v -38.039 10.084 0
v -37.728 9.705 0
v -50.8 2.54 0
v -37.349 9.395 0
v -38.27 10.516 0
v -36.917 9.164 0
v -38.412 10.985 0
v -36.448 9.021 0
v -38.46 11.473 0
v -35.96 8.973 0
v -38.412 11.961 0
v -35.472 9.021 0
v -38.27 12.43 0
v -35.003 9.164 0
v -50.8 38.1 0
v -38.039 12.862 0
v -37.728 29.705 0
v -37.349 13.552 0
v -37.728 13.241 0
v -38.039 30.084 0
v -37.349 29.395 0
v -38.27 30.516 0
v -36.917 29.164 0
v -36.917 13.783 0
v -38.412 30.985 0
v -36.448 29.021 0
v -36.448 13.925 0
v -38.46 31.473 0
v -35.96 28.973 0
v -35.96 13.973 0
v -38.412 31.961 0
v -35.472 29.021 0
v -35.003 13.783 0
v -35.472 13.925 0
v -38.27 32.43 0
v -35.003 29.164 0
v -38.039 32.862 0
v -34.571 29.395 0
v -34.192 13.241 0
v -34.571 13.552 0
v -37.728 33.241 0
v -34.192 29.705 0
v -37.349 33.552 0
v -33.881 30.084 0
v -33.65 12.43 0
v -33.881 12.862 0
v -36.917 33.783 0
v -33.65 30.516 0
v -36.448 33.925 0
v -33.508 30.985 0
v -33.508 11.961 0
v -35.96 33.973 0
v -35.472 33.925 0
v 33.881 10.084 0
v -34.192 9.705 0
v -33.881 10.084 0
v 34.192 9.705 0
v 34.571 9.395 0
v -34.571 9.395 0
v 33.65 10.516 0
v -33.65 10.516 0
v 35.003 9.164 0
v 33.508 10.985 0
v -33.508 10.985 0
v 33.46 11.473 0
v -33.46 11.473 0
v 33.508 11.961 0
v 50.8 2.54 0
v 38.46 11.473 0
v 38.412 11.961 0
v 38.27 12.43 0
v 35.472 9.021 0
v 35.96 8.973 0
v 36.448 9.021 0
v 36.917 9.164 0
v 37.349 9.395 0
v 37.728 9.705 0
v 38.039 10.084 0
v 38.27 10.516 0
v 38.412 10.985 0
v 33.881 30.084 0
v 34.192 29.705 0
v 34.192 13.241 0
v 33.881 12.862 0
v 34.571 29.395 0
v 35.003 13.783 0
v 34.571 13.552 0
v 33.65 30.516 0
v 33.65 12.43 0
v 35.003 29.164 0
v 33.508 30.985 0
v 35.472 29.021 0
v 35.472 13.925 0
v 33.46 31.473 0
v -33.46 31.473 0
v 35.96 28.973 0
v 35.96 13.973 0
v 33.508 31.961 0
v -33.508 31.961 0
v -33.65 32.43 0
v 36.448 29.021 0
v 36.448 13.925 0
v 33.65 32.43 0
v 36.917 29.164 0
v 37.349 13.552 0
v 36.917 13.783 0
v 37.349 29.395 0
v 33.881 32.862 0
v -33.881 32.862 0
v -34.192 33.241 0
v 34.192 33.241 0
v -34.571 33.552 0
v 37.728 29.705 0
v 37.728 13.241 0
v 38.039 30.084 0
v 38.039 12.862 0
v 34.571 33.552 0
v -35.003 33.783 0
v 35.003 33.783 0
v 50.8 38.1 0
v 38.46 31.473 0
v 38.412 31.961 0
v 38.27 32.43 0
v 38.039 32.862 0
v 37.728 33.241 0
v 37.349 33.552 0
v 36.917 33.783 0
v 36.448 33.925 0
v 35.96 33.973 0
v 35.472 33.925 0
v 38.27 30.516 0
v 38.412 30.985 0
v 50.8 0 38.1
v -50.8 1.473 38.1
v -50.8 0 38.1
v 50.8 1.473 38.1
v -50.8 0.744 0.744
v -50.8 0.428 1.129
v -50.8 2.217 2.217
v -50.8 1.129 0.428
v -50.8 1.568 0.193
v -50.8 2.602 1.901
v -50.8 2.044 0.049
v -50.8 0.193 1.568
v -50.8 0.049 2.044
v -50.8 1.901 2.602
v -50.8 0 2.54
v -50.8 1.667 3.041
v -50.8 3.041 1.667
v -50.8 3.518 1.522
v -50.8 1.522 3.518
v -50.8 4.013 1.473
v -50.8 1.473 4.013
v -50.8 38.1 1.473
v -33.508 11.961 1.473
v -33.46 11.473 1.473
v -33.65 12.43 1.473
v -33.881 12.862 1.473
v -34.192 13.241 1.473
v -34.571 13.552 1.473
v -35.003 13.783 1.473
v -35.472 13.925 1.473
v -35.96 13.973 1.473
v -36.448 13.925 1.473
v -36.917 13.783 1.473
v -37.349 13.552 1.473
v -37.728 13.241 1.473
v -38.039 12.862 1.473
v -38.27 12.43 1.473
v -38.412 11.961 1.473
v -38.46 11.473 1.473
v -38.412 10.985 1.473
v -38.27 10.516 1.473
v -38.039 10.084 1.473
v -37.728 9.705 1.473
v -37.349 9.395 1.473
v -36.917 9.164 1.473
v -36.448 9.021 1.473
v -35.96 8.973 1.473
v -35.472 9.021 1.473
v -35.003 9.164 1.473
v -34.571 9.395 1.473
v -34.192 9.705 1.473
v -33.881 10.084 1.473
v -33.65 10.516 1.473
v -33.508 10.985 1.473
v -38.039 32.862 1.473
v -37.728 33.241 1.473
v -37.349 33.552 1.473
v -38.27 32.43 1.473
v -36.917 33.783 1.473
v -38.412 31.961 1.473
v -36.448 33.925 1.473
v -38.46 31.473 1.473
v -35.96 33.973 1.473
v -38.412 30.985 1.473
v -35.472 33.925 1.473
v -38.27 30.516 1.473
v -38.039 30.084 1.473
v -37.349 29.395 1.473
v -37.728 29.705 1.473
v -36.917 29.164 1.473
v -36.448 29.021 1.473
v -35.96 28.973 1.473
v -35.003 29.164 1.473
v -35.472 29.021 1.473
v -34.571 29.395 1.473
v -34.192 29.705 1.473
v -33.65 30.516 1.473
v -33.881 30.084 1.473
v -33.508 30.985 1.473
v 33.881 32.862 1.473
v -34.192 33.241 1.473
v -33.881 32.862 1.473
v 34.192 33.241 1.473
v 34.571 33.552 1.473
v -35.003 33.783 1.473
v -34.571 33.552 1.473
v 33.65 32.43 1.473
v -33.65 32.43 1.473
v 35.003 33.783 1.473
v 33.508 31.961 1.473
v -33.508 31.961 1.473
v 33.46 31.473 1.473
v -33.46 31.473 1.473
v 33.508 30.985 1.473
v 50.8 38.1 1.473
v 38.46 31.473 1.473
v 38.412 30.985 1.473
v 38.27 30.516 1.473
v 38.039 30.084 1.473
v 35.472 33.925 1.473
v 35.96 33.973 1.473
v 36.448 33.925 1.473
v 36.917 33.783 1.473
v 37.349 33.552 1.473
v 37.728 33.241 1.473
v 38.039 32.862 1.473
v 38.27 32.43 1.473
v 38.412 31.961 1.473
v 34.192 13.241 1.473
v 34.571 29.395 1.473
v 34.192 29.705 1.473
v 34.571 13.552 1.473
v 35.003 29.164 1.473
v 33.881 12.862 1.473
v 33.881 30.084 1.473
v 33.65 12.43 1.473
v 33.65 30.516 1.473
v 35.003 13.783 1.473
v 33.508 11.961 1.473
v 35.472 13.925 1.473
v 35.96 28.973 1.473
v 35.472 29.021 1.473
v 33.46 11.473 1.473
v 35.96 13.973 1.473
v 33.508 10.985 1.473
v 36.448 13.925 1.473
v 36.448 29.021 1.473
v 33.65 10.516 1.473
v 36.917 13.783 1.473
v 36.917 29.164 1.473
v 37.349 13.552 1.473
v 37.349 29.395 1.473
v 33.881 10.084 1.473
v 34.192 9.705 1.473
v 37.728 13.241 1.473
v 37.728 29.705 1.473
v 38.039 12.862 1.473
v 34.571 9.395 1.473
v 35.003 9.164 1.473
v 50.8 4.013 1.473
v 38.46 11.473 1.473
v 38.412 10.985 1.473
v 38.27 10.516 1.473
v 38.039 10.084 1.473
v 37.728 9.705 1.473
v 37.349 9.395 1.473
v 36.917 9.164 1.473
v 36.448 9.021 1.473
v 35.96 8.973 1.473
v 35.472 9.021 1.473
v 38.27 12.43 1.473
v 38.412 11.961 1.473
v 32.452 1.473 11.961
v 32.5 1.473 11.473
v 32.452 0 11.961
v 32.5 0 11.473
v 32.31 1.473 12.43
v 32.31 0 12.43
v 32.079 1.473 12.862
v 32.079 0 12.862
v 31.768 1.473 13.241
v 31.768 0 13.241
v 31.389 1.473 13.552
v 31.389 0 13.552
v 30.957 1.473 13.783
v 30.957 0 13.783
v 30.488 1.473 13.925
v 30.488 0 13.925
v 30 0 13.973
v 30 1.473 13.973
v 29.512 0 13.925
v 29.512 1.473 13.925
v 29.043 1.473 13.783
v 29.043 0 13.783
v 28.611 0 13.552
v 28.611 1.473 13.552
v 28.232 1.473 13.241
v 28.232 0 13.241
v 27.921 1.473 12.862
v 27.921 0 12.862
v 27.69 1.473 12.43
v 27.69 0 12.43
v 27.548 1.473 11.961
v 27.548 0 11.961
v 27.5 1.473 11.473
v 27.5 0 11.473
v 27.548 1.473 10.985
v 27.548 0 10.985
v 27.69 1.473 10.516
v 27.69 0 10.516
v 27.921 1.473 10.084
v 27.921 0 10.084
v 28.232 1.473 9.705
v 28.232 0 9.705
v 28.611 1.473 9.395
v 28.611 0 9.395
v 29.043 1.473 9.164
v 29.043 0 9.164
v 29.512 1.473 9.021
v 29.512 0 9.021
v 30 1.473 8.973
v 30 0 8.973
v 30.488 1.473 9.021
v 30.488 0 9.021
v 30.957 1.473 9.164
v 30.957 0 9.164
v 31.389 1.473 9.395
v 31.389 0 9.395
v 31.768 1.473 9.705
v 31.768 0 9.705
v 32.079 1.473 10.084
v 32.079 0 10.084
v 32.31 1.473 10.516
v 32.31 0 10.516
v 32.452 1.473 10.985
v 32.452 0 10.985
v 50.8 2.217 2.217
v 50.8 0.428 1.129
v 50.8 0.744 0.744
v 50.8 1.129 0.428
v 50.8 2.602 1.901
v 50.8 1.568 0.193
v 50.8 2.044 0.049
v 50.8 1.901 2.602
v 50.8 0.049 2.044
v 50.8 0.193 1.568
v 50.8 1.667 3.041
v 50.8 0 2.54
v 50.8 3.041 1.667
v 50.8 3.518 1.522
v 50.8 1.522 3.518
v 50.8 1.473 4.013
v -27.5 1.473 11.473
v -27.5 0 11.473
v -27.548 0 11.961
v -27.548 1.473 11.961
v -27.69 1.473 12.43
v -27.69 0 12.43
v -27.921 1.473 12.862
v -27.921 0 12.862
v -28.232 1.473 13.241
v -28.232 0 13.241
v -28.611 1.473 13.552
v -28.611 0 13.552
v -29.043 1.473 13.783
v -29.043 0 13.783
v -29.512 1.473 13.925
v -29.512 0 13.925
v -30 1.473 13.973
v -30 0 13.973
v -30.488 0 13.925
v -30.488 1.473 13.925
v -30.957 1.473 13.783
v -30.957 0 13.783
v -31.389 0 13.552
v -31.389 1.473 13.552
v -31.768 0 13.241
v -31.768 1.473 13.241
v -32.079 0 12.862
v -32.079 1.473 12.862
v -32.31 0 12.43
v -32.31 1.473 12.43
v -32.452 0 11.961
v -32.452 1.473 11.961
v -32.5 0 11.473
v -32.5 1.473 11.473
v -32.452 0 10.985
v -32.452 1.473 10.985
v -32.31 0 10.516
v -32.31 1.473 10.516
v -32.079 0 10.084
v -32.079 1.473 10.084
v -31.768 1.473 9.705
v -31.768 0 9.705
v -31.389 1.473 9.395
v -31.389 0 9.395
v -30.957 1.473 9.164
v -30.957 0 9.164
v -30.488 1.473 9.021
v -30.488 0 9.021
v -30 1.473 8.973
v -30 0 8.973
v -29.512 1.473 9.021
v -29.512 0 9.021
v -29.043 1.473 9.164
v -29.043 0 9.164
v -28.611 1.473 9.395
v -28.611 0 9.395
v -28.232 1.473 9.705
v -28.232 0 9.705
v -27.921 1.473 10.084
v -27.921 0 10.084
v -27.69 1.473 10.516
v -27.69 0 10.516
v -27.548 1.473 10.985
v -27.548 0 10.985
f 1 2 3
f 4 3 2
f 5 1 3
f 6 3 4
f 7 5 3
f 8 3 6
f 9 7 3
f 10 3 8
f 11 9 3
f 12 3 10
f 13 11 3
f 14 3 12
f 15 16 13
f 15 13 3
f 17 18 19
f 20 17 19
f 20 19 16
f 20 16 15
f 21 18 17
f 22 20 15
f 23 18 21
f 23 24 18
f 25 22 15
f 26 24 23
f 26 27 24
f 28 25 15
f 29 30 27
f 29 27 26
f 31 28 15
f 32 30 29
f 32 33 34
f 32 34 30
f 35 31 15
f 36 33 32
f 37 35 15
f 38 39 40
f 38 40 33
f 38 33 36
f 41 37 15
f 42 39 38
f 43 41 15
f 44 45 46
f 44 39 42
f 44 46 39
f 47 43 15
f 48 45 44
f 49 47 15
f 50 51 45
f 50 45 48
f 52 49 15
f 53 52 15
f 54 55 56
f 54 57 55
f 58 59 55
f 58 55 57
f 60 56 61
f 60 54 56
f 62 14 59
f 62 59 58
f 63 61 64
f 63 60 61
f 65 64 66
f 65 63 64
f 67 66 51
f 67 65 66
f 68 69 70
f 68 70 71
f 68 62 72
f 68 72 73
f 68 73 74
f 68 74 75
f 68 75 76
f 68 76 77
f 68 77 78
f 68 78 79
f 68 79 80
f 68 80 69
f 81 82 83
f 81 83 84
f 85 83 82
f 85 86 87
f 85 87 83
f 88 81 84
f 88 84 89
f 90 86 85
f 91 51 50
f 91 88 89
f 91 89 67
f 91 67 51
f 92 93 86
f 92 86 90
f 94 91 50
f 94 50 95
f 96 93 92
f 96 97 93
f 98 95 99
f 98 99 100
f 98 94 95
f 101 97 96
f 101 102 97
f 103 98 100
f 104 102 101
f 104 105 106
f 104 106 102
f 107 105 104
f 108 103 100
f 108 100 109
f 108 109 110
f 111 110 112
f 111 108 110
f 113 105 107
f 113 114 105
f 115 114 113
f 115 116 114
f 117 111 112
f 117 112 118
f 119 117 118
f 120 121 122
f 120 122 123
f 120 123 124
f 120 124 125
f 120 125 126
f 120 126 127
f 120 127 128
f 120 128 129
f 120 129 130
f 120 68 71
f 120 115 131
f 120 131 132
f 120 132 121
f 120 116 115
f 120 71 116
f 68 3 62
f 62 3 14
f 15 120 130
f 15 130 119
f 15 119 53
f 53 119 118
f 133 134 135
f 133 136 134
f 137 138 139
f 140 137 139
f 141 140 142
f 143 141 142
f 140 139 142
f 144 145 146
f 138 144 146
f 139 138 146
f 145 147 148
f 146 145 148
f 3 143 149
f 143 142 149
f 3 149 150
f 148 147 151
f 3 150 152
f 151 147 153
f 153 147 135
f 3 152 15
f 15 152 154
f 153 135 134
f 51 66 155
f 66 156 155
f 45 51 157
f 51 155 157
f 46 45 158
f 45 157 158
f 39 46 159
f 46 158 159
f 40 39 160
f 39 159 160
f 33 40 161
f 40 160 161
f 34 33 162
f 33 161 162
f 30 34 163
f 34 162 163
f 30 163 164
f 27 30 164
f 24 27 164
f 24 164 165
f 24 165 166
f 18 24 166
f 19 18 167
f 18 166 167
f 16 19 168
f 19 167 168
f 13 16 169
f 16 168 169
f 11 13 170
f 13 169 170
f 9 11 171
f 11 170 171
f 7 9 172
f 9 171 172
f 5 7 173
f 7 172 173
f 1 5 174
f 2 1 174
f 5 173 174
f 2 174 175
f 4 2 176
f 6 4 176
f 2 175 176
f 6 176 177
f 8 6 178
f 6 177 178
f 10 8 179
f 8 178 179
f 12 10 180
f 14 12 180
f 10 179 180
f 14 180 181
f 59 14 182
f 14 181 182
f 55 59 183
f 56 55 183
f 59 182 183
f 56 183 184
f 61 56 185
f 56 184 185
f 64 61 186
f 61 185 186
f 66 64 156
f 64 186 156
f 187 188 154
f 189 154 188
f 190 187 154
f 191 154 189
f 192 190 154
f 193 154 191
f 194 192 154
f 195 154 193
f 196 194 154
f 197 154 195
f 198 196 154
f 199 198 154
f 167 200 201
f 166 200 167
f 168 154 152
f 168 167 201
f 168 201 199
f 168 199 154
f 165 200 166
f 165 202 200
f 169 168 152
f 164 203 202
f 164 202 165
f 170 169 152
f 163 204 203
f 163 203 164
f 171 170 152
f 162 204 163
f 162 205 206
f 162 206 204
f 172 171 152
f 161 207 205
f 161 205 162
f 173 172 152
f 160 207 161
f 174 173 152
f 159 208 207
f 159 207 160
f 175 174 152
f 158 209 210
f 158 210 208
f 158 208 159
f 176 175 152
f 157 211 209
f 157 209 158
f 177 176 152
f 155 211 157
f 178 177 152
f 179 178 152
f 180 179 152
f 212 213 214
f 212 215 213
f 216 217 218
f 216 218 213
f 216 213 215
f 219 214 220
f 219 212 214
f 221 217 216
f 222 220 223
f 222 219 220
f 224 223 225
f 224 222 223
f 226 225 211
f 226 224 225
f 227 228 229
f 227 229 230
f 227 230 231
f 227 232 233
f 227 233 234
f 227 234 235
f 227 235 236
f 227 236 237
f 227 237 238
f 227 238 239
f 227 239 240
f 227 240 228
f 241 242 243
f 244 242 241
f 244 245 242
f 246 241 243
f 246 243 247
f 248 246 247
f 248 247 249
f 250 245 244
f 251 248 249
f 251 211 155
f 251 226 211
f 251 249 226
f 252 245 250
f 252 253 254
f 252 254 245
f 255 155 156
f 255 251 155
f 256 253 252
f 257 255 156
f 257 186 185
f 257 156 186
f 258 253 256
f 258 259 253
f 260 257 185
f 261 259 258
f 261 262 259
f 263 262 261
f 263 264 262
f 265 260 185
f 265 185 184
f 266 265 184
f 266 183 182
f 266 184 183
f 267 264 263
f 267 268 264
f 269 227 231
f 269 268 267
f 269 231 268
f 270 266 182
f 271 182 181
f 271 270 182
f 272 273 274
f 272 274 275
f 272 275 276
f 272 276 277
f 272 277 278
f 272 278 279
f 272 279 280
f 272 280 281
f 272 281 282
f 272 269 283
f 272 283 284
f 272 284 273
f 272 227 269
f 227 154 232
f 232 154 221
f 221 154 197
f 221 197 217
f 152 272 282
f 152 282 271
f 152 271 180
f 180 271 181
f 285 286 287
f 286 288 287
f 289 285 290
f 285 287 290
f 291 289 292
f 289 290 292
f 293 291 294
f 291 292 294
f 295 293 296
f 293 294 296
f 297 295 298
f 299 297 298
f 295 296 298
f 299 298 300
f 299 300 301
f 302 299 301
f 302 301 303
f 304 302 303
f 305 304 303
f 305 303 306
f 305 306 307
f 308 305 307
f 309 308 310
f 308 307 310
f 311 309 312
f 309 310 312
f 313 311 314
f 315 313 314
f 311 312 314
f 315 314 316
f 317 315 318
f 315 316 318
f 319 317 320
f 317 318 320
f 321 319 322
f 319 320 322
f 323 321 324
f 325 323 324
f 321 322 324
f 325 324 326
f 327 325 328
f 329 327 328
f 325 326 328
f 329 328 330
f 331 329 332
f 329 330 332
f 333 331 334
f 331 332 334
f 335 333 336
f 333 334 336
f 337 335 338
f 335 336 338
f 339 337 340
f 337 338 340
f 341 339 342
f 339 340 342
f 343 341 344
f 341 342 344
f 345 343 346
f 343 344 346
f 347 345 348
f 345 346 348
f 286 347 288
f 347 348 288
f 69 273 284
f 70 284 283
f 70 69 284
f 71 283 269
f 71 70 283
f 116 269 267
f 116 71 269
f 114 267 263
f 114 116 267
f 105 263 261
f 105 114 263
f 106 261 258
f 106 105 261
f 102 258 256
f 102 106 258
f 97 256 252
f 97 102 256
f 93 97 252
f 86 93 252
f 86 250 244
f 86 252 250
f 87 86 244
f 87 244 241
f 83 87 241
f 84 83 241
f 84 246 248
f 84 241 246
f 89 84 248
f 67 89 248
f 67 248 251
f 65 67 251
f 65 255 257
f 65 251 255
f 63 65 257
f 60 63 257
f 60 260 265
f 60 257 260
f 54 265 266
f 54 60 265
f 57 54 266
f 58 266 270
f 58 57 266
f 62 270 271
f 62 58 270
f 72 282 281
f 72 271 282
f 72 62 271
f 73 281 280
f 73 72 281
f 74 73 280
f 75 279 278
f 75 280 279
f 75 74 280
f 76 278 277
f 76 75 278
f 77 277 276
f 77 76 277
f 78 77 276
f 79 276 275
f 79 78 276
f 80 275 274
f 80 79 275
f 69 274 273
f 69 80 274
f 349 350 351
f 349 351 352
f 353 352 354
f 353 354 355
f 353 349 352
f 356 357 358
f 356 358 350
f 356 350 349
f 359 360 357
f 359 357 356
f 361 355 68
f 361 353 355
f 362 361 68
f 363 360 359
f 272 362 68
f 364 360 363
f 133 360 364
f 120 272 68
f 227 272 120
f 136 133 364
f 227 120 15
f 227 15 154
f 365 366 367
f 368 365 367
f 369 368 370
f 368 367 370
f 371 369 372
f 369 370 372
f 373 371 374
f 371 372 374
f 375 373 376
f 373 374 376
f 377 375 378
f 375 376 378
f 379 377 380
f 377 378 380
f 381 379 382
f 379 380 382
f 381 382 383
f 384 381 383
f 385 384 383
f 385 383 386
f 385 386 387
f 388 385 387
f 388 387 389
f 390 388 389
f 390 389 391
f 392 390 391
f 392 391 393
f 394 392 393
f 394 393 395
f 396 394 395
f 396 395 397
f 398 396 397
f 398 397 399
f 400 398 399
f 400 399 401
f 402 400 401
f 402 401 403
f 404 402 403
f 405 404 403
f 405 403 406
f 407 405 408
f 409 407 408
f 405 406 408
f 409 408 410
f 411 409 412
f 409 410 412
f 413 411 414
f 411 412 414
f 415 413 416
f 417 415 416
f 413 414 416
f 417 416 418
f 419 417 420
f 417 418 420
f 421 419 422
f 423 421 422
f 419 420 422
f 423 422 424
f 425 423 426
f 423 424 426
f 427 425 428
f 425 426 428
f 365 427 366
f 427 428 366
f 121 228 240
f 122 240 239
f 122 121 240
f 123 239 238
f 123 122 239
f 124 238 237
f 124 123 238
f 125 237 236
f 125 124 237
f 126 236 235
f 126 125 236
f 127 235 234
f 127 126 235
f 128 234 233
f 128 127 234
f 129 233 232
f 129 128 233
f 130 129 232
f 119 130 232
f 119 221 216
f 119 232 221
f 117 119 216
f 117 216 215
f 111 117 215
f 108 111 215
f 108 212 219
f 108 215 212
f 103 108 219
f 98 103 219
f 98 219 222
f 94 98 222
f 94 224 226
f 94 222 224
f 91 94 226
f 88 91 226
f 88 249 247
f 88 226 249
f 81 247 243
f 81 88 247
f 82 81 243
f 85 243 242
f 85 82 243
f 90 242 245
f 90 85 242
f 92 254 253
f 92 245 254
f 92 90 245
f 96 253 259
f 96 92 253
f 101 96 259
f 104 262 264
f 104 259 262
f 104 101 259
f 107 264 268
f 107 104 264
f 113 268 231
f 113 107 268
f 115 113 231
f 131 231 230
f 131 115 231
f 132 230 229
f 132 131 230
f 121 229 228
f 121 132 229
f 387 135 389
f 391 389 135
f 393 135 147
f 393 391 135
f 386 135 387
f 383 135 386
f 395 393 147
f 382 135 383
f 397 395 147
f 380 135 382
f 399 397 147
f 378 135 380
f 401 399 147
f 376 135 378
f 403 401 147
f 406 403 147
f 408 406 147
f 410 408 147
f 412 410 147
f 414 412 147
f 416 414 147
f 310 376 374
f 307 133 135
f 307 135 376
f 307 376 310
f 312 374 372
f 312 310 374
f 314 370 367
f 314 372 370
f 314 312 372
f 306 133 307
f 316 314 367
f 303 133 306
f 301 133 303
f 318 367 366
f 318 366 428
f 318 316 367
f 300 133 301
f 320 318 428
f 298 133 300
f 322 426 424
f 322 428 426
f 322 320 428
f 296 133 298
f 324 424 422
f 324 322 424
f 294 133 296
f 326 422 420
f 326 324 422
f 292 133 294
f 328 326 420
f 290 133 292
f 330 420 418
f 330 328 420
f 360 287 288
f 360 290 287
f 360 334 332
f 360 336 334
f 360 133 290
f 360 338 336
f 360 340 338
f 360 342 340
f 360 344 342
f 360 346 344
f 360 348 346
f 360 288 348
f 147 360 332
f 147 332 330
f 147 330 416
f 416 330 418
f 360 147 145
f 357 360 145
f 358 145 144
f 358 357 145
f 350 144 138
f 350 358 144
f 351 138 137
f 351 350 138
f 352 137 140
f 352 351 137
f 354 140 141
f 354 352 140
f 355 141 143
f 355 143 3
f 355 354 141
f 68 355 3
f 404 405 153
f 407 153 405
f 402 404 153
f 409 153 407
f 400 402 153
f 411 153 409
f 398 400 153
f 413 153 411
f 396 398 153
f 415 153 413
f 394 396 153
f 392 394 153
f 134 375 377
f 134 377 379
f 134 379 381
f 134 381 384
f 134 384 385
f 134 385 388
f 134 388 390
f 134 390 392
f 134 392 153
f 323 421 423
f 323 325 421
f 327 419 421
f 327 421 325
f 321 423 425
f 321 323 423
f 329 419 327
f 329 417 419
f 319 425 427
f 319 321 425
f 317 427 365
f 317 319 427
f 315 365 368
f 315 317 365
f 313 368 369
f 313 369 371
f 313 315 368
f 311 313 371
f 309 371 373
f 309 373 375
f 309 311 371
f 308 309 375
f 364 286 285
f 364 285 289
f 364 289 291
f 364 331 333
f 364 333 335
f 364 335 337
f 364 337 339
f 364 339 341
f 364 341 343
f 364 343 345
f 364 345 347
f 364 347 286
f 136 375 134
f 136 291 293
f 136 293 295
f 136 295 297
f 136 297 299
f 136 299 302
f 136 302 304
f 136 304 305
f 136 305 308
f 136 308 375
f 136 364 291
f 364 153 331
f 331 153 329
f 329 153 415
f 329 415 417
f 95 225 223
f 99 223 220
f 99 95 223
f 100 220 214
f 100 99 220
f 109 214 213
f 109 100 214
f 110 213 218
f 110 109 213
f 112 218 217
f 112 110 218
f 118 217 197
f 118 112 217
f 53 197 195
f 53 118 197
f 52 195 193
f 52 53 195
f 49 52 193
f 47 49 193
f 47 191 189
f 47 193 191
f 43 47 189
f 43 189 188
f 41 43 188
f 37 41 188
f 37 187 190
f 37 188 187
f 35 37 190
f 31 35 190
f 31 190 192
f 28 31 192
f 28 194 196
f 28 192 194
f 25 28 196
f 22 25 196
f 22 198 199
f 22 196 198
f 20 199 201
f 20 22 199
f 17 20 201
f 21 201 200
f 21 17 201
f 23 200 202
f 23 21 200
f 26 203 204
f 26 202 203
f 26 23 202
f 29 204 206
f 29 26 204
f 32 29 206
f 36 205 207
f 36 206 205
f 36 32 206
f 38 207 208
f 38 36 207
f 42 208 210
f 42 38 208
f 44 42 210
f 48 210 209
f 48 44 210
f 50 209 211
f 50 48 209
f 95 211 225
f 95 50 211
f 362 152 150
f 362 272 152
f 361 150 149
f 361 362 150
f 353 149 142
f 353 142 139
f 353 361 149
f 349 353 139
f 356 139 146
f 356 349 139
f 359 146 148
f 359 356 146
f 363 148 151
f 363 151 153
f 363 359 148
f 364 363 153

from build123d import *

# Parameters (mm, degrees)
F1_DEPTH = 50.8
F2_R     = 2.5
F3_DEPTH = 12.7
F4_R     = 2.5
F5_DEPTH = 12.7


with BuildPart() as f1:
    # F0 (on Right) → F1 (new body, symmetric)
    with BuildSketch(Plane.YZ):
        with BuildLine():
            Line((1.4732, 38.1), (0, 38.1))
            Line((0, 38.1), (0, 2.54))
            ThreePointArc((0, 2.54), (0.7439487758, 0.7439487758), (2.54, 0))
            Line((2.54, 0), (38.1, 0))
            Line((38.1, 0), (38.1, 1.4732))
            Line((38.1, 1.4732), (4.0132, 1.4732))
            ThreePointArc((4.0132, 1.4732), (2.2171487758, 2.2171487758), (1.4732, 4.0132))
            Line((1.4732, 4.0132), (1.4732, 38.1))
        make_face()
    extrude(amount=F1_DEPTH, both=True)

    # F2 (on Top) → F3 (cut, symmetric)
    with BuildSketch(Plane.XY):
        with Locations((35.9598398209, 11.4732)):
            Circle(F2_R)
        with Locations((35.9598398209, 31.4732)):
            Circle(F2_R)
        with Locations((-35.9598398209, 31.4732)):
            Circle(F2_R)
        with Locations((-35.9598398209, 11.4732)):
            Circle(F2_R)
    extrude(amount=F3_DEPTH, both=True, mode=Mode.SUBTRACT)

    # F4 (on Front) → F5 (cut, symmetric)
    with BuildSketch(Plane.XZ):
        with Locations((-30, 11.4732)):
            Circle(F4_R)
        with Locations((30, 11.4732)):
            Circle(F4_R)
    extrude(amount=F5_DEPTH, both=True, mode=Mode.SUBTRACT)


solid = f1.part
